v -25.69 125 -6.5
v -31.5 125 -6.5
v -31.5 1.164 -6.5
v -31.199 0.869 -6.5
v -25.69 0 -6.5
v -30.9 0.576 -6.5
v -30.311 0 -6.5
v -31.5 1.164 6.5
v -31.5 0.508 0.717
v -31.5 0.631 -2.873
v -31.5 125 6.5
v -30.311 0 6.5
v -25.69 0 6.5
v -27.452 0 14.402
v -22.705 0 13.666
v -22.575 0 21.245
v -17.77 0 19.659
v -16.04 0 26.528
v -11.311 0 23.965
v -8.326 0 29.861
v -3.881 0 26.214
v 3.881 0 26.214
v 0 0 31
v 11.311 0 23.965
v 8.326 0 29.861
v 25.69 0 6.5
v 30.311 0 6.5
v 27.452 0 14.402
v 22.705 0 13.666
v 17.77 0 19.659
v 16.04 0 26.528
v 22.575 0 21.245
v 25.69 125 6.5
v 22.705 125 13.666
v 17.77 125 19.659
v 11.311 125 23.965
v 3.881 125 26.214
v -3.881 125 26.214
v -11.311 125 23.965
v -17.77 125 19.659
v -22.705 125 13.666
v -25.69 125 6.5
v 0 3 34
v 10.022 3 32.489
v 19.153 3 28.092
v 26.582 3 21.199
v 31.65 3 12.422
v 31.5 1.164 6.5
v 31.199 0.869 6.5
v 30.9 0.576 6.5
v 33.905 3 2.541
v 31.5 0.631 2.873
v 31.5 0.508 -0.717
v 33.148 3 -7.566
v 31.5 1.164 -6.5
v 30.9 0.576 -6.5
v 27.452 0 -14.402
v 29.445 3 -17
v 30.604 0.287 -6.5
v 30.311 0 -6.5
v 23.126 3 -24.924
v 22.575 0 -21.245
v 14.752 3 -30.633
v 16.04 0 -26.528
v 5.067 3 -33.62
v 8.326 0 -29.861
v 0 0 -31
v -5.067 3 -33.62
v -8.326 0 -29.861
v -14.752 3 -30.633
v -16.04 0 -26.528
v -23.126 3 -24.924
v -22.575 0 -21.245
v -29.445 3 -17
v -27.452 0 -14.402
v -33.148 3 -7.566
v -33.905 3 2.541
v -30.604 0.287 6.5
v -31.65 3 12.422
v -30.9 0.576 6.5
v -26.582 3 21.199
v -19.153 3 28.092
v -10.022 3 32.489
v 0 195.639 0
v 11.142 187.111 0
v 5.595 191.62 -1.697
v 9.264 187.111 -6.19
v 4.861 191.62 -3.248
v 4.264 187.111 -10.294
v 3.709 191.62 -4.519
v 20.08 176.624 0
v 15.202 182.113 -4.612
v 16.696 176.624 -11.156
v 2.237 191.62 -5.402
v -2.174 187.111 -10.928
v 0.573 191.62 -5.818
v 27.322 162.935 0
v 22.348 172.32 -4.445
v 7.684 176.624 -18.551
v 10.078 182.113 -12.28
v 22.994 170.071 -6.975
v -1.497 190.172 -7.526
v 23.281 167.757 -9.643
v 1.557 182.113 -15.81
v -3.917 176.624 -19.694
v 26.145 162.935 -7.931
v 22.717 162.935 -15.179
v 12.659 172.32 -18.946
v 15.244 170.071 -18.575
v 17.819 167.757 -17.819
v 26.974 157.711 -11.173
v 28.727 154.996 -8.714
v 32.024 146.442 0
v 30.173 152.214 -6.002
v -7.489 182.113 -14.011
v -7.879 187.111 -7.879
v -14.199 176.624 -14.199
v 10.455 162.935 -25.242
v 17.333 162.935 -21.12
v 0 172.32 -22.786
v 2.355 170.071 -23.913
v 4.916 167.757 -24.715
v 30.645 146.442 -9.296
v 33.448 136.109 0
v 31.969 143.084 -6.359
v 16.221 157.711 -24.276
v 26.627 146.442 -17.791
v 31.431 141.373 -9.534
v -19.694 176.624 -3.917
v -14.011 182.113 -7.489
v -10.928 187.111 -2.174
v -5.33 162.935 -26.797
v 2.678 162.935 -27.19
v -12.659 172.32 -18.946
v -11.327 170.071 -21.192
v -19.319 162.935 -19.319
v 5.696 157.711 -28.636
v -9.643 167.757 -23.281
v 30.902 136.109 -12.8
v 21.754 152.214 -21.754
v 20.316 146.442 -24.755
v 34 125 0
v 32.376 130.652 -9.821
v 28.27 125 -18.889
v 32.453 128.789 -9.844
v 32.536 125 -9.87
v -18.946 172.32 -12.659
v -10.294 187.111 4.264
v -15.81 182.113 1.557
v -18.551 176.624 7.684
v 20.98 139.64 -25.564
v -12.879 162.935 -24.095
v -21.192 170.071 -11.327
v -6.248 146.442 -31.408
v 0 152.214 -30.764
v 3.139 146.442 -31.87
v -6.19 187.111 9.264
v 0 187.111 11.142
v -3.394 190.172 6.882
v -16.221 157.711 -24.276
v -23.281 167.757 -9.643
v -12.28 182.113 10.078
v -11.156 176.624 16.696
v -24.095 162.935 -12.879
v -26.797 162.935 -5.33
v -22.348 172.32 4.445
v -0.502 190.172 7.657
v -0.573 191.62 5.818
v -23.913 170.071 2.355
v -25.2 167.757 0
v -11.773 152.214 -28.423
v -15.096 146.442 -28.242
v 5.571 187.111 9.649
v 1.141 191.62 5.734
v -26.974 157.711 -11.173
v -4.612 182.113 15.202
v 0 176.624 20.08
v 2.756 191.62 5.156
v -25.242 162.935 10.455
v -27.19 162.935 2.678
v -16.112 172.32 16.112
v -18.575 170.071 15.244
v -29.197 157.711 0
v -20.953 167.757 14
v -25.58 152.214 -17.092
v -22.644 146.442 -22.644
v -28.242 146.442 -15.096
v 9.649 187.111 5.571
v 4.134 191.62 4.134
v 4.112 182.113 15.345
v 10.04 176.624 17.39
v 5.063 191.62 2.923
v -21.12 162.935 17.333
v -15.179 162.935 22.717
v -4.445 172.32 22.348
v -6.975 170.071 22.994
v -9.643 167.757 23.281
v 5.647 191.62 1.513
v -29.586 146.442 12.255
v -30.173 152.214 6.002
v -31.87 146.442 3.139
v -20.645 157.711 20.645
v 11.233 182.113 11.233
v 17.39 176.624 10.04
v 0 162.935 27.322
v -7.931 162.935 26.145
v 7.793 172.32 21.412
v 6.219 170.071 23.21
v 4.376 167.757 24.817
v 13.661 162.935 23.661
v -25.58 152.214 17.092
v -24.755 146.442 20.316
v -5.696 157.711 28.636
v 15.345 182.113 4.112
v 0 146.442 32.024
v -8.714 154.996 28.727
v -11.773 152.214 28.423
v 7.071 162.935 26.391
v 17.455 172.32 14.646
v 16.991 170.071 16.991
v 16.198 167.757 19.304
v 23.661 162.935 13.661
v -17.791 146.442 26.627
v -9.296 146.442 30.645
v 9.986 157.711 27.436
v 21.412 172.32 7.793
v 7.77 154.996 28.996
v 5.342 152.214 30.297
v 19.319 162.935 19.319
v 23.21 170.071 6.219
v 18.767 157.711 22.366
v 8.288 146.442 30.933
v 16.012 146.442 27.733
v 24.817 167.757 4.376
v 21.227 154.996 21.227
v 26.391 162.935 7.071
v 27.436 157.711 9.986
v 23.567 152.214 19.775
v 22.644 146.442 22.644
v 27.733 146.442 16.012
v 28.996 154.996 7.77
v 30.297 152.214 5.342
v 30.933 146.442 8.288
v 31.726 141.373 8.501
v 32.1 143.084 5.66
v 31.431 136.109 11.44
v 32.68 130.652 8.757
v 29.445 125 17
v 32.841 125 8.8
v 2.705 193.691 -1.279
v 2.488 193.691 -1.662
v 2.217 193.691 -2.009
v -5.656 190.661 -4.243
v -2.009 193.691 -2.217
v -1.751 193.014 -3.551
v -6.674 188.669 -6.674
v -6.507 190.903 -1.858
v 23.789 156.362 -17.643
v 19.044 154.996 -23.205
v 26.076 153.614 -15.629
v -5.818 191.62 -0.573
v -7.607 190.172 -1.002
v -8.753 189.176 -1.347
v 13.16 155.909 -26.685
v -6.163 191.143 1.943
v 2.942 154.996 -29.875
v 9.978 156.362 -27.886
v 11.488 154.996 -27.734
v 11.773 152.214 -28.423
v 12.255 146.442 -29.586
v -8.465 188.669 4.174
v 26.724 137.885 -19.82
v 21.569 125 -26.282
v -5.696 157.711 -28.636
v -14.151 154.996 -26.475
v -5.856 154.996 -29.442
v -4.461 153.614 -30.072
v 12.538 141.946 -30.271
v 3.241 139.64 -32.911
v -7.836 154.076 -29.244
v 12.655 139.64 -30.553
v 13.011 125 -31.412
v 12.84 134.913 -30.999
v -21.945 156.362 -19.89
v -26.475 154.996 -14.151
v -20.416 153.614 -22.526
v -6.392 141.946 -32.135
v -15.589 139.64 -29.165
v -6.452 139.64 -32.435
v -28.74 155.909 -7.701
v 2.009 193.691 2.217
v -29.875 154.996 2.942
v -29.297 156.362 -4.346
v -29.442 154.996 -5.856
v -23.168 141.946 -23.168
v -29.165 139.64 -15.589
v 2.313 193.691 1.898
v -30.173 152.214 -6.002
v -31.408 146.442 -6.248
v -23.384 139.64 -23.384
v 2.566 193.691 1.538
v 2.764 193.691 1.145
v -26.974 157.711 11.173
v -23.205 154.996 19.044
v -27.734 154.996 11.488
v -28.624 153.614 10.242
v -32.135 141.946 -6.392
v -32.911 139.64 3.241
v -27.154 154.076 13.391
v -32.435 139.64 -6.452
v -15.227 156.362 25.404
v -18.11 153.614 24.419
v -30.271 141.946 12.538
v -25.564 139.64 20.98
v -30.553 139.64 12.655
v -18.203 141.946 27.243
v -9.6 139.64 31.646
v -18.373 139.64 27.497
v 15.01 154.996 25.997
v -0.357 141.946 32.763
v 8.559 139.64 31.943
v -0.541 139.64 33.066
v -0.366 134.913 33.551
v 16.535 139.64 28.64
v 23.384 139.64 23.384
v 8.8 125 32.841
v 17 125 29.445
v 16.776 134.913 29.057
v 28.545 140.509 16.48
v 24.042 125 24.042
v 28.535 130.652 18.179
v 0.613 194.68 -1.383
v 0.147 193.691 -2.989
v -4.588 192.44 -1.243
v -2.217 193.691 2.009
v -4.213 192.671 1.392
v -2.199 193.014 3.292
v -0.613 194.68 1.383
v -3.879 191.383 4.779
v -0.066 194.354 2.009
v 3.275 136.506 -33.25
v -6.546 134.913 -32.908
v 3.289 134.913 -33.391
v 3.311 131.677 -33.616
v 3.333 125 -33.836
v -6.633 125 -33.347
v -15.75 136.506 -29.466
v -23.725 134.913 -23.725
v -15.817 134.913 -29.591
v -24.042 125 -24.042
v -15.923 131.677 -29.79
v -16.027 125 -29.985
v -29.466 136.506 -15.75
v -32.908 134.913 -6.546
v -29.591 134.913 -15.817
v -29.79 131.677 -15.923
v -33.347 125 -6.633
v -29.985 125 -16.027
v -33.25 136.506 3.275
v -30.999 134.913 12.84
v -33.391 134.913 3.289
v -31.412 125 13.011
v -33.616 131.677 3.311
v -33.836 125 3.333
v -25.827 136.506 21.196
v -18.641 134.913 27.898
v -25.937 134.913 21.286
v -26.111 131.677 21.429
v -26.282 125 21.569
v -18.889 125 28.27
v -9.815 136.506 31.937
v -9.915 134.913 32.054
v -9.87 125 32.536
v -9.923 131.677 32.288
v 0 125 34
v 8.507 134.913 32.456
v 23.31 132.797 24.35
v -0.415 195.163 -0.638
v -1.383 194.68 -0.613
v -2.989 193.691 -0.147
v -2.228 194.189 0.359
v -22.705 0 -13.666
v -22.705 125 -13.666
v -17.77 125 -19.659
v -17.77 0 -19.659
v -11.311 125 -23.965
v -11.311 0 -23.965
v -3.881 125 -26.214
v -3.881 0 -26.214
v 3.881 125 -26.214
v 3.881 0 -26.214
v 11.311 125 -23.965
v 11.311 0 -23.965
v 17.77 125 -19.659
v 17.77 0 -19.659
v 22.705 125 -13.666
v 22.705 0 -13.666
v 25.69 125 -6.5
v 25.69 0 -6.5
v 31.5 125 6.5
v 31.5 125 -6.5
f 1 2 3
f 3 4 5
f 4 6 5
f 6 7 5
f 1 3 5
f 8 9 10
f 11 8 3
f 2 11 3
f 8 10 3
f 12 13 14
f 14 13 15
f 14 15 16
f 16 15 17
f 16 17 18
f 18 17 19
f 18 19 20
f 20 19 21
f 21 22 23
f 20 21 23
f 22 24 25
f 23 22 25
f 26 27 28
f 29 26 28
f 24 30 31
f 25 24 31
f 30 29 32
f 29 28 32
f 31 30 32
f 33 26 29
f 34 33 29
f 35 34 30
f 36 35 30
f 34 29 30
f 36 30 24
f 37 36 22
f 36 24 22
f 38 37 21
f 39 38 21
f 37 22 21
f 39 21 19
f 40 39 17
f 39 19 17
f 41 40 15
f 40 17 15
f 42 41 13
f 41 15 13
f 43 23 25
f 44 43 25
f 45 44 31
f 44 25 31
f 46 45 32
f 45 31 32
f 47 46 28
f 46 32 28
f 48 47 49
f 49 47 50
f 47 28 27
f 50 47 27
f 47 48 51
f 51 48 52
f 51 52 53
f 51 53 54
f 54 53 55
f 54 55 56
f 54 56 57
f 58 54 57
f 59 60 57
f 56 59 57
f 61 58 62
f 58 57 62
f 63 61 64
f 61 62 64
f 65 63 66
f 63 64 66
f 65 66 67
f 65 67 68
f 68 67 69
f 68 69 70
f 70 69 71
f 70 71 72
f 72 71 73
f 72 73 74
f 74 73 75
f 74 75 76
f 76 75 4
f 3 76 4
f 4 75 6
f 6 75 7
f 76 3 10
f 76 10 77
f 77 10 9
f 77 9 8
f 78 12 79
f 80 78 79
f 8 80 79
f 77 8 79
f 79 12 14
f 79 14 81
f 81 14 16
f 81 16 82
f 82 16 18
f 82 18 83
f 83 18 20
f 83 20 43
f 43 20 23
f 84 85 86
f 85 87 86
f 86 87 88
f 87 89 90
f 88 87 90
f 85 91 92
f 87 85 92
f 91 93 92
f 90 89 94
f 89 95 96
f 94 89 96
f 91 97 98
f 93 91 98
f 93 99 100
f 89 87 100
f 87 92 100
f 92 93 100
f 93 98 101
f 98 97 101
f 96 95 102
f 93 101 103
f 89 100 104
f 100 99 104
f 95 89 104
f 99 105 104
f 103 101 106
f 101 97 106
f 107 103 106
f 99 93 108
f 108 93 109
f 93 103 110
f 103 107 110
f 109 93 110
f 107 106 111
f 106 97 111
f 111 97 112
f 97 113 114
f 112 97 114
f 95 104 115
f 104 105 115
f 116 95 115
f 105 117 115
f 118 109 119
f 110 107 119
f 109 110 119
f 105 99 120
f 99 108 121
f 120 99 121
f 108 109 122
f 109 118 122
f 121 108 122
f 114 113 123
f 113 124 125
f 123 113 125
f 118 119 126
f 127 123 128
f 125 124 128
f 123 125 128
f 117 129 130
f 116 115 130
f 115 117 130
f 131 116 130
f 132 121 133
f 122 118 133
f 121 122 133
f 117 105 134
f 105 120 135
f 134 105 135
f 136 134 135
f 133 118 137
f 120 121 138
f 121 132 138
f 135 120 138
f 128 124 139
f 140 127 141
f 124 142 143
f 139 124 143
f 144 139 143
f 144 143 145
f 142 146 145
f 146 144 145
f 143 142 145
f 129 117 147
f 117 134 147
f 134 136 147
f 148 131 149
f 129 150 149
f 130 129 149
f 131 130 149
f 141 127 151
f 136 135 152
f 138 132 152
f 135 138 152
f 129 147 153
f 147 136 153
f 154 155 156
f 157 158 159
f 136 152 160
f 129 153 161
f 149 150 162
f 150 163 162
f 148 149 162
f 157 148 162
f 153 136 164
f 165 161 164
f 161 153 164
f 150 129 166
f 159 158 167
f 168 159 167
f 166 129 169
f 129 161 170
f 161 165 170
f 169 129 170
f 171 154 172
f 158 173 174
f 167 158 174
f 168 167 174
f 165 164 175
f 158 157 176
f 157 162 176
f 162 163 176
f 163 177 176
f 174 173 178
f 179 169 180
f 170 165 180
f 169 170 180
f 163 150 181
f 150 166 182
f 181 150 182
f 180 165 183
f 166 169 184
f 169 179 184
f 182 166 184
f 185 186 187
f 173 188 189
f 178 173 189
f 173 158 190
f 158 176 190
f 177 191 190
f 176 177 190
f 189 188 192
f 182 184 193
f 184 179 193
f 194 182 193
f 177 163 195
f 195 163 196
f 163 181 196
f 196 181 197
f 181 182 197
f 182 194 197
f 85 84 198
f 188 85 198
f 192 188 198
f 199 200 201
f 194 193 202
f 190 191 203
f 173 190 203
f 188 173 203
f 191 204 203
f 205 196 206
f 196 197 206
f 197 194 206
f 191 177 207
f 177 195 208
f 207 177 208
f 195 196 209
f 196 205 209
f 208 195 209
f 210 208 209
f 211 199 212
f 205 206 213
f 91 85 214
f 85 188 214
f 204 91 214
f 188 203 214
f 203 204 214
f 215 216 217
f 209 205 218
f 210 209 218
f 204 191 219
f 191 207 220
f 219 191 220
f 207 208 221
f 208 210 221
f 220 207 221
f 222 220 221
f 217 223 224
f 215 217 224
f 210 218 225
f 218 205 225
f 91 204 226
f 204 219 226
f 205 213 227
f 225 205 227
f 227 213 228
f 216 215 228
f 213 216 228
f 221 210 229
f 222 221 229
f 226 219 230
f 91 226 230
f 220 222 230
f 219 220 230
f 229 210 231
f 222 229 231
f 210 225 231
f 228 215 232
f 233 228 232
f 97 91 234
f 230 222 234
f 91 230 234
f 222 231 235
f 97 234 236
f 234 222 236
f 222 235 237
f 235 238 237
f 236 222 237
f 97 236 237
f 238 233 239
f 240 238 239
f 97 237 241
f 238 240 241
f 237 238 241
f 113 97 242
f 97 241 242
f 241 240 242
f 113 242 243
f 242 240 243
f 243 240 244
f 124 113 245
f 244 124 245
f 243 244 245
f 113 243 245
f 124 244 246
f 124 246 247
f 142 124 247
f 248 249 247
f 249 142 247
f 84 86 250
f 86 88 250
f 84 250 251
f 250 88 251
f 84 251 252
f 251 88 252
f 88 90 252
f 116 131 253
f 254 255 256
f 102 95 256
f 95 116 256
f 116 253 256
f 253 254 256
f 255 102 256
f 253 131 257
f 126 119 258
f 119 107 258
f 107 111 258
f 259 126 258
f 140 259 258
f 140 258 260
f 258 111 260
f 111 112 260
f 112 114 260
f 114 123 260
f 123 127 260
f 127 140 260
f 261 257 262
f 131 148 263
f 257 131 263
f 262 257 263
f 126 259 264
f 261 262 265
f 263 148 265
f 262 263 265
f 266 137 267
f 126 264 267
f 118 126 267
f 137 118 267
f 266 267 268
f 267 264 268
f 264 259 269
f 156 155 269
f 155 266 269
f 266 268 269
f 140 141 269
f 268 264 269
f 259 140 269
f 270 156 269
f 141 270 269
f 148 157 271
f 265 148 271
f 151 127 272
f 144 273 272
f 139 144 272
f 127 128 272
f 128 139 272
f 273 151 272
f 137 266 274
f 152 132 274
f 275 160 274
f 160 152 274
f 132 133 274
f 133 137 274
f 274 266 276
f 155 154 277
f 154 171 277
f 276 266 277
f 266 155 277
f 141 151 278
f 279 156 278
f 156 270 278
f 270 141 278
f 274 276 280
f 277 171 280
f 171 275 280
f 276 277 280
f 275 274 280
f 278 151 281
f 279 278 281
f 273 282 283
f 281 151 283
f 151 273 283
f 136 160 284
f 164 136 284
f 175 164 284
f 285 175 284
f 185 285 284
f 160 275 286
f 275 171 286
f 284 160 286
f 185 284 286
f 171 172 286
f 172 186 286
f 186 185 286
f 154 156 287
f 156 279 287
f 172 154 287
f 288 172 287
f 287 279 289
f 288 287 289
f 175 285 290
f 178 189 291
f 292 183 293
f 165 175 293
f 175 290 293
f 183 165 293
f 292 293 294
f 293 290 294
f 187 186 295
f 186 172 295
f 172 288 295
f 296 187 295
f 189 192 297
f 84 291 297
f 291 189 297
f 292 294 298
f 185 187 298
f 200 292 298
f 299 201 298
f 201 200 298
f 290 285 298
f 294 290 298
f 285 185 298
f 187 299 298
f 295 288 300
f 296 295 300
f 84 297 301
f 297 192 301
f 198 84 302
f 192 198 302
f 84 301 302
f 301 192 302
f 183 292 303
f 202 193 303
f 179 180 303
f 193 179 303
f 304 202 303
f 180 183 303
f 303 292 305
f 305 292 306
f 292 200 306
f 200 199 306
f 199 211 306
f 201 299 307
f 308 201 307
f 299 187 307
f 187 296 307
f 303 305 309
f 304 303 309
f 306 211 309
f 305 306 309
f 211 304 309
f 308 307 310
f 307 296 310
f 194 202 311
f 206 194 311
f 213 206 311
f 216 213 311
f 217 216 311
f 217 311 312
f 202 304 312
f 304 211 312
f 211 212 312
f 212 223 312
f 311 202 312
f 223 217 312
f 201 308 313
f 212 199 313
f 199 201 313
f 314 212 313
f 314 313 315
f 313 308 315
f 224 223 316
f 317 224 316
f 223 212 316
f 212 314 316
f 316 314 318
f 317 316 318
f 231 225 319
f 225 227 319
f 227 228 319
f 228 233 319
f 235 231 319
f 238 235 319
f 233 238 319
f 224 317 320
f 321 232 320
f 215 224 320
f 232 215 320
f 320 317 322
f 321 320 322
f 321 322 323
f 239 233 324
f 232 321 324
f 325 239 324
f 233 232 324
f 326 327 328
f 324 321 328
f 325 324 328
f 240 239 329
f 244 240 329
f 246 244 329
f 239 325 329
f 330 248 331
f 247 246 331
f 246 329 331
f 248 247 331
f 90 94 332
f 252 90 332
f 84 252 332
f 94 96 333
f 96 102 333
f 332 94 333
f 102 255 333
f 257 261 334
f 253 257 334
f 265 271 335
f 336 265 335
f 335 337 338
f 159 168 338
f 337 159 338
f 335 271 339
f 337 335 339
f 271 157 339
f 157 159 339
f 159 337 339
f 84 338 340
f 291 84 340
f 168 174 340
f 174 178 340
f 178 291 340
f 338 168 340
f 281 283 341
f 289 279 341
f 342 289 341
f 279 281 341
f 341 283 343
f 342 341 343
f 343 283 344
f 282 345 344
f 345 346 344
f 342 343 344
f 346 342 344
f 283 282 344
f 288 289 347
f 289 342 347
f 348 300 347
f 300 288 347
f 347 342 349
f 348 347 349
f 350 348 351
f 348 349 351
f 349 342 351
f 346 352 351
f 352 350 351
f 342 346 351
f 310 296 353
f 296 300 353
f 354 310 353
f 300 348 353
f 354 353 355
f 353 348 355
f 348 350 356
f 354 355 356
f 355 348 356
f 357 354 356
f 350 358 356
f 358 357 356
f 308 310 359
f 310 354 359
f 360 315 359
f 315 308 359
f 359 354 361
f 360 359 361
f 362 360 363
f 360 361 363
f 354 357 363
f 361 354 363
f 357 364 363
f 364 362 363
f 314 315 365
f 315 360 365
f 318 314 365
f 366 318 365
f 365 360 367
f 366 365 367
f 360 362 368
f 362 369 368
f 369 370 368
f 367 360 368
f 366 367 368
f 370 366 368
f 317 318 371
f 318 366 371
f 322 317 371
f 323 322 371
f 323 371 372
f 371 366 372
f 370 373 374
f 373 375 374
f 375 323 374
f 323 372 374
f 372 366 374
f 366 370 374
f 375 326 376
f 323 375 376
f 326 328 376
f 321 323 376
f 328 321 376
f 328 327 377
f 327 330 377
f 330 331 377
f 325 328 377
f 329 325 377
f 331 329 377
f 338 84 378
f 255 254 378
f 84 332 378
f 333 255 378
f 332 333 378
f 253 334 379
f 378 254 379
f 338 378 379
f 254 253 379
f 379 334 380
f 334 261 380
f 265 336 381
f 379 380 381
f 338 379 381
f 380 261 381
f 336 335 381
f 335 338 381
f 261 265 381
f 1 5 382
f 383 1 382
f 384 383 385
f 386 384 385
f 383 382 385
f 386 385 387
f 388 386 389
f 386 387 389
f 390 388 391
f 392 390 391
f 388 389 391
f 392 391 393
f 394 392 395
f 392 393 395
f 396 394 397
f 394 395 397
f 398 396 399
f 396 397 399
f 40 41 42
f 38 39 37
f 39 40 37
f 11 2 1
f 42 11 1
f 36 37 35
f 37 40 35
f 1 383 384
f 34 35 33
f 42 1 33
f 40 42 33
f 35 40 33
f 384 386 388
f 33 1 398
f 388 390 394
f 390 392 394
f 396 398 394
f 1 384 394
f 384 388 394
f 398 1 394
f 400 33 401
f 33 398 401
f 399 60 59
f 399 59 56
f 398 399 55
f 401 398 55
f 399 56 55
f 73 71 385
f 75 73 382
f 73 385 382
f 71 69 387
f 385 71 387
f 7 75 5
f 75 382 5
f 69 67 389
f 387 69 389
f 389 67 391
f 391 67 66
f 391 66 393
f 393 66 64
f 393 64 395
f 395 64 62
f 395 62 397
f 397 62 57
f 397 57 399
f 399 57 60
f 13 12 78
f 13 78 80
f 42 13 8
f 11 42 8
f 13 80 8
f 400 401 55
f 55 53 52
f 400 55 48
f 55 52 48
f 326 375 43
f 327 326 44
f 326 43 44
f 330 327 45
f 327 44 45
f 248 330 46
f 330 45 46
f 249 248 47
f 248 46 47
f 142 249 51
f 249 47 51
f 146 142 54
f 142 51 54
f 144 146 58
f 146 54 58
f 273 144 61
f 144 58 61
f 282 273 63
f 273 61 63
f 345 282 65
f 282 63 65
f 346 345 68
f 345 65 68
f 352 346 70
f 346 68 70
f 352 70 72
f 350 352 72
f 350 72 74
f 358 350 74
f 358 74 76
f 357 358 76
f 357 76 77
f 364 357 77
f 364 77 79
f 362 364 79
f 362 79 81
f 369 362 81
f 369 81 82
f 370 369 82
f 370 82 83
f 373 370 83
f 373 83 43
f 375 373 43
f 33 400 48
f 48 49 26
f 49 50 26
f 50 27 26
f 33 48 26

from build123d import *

# Parameters (mm, degrees)
SKETCH1_R           = 34
BOSS_EXTRUDE1_DEPTH = 125
CHAMFER1_SIZE       = 3


with BuildPart() as part:
    # Sketch1 → Boss-Extrude1 (new body)
    with BuildSketch(Plane(origin=(0, 0, 0), x_dir=(1, 0, 0), z_dir=(0, 1, 0))):
        with Locations(Location((0, 0, 0), (0, 0, 270))):
            Circle(SKETCH1_R)
        with BuildLine():
            Line((31.5, 6.5), (31.5, -6.5))
            Line((31.5, -6.5), (25.690465157, -6.5))
            ThreePointArc((25.690465157, -6.5), (0, -26.5), (-25.690465157, -6.5))
            Line((-25.690465157, -6.5), (-31.5, -6.5))
            Line((-31.5, -6.5), (-31.5, 6.5))
            Line((-31.5, 6.5), (-25.690465157, 6.5))
            ThreePointArc((-25.690465157, 6.5), (0, 26.5), (25.690465157, 6.5))
            Line((25.690465157, 6.5), (31.5, 6.5))
        make_face(mode=Mode.SUBTRACT)
    extrude(amount=BOSS_EXTRUDE1_DEPTH)

    # Sketch2 → Revolve1 (revolve)
    with BuildSketch(Plane.XY):
        with BuildLine():
            Line((0, 125), (0, 195.638896549))
            add(Edge.make_bspline(
                [(0, 195.638896549), (33.497794894, 174.990797279), (34, 125)],
                knots=[0, 0, 0, 1, 1, 1], degree=2))
            Line((34, 125), (0, 125))
        make_face()
    revolve(axis=Axis((0, 125, 0), (0, 1, 0)))

    # Chamfer1
    # the kernel refuses this chamfer: 3 mm, written as the material it takes off along each edge
    with BuildSketch(Plane(origin=(0, 0, 0), x_dir=(0, 0, 1), z_dir=(-1, 0, 0))) as chamfer1_piece_1:
        Polygon((34, CHAMFER1_SIZE), (34 - CHAMFER1_SIZE, 0), (34, 0), align=None)
    revolve(axis=Axis((0, 0, 0), (0, 1, 0)), mode=Mode.SUBTRACT)


solid = part.part
